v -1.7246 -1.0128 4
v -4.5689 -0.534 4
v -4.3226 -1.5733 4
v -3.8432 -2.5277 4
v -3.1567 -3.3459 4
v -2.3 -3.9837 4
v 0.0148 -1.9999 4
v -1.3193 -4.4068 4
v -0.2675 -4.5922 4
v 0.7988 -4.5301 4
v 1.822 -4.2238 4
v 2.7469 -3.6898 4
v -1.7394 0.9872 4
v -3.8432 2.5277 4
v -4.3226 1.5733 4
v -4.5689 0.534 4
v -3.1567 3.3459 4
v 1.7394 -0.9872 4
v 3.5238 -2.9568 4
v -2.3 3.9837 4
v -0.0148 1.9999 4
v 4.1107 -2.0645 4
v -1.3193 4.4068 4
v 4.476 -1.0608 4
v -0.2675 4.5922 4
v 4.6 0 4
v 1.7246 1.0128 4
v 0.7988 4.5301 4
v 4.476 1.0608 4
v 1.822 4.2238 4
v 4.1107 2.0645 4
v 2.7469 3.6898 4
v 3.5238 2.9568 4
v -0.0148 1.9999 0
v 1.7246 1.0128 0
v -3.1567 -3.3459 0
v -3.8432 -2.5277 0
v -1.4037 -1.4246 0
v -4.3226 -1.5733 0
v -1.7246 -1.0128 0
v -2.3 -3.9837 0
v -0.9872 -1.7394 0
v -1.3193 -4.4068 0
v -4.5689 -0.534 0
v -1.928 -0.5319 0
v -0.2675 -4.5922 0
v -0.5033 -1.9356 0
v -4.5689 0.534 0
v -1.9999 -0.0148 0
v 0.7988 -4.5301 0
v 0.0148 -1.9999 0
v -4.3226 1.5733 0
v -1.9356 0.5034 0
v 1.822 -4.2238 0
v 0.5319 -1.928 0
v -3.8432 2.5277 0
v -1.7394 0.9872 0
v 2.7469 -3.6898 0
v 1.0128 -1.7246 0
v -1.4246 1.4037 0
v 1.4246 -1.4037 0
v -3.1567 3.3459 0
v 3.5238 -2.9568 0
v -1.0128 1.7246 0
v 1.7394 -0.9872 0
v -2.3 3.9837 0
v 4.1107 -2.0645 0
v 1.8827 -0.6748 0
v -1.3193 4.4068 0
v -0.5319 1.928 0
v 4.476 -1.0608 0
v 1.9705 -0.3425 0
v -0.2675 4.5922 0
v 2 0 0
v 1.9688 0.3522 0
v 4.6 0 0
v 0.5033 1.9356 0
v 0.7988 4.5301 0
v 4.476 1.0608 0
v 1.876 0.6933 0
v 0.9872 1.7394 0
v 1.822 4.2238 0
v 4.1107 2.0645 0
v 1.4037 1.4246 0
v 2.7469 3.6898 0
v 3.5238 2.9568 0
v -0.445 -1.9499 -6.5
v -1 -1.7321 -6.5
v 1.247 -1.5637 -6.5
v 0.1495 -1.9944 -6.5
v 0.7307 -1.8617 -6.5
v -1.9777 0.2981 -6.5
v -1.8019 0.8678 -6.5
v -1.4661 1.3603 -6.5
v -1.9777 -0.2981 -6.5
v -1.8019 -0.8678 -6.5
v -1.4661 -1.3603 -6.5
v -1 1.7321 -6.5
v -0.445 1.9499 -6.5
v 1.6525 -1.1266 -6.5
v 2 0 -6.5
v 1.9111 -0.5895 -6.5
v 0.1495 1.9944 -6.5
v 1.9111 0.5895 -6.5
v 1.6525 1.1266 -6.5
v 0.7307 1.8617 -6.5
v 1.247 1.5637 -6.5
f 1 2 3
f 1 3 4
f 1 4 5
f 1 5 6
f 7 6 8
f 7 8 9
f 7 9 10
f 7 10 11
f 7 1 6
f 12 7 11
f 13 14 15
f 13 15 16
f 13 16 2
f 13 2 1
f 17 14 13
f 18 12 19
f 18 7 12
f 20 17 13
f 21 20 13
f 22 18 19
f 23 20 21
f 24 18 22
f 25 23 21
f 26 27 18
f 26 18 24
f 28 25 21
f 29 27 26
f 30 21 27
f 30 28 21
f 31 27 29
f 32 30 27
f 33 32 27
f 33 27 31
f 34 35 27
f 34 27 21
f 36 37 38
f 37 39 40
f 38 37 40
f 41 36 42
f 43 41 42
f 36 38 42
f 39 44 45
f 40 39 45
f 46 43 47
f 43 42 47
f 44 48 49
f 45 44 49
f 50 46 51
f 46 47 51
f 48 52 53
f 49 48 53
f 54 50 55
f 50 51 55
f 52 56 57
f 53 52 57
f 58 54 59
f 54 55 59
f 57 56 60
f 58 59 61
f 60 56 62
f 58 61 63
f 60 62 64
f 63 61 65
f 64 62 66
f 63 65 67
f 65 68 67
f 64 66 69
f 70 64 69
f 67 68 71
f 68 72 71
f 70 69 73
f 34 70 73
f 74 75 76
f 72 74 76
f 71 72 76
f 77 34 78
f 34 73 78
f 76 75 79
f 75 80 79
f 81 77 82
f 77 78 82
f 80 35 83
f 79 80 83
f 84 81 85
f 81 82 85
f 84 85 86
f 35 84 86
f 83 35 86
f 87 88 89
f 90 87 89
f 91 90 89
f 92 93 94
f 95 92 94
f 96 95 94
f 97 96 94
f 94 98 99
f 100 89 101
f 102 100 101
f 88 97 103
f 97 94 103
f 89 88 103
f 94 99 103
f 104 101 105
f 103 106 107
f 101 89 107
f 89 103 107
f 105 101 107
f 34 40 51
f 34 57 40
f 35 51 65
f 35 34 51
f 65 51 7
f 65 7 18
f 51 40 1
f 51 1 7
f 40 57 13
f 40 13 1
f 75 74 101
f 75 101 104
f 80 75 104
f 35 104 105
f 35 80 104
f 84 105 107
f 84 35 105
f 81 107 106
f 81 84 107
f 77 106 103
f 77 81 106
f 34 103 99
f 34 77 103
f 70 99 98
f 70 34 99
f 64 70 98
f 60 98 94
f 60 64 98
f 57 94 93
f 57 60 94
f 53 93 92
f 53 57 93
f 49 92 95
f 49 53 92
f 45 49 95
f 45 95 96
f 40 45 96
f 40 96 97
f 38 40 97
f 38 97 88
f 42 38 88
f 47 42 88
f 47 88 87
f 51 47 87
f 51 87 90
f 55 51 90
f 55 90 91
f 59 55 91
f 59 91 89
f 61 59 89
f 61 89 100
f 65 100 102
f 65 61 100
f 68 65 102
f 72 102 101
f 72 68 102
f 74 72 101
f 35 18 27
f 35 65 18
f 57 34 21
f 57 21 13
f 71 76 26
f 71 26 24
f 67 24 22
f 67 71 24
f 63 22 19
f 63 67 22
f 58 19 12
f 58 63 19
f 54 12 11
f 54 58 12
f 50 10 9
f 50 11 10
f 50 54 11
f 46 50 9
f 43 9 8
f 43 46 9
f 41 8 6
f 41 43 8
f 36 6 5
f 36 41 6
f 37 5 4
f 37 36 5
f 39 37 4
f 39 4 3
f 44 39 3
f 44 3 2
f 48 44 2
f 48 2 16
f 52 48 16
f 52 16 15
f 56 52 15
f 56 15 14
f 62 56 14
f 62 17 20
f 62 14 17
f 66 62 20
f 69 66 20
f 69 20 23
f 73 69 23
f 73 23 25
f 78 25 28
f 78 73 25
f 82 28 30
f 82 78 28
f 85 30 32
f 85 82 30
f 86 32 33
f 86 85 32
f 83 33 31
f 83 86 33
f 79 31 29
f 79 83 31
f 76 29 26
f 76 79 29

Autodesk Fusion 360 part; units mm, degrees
sketch "Sketch1" plane through (0, 0, 0) normal (0, 0, 1) x (1, 0, 0)
  circle A0 centre (0, 0) radius 4.6
  circle A1 centre (0, 0) radius 2
  line L0 (1.7394, -0.9872) -> (1.7246, 1.0128)
  line L1 (1.7246, 1.0128) -> (-0.0148, 1.9999)
  line L2 (-0.0148, 1.9999) -> (-1.7394, 0.9872)
  line L3 (-1.7394, 0.9872) -> (-1.7246, -1.0128)
  line L4 (-1.7246, -1.0128) -> (0.0148, -1.9999)
  line L5 (0.0148, -1.9999) -> (1.7394, -0.9872)
  dimension "d1" = 9.2
  dimension "d2" = 4
extrude "Extrude1" add sketch "Sketch1" against normal blind 6.5 contours A1 L0 | A1 L1 | L0 L1 L2 L3 L4 L5 | A1 L5 | A1 L2 | A1 L4 | A1 L3 makes body 1
extrude "Extrude2" add sketch "Sketch1" along normal blind 4 separate body contours A0 | A1 L0 | A1 L1 | A1 L5 | A1 L2 | A1 L4 | A1 L3 makes body 2
thread "Thread1" thread offset 0 thread length 10
combine "Combine1" operation add target body 1 tool bodies 2
